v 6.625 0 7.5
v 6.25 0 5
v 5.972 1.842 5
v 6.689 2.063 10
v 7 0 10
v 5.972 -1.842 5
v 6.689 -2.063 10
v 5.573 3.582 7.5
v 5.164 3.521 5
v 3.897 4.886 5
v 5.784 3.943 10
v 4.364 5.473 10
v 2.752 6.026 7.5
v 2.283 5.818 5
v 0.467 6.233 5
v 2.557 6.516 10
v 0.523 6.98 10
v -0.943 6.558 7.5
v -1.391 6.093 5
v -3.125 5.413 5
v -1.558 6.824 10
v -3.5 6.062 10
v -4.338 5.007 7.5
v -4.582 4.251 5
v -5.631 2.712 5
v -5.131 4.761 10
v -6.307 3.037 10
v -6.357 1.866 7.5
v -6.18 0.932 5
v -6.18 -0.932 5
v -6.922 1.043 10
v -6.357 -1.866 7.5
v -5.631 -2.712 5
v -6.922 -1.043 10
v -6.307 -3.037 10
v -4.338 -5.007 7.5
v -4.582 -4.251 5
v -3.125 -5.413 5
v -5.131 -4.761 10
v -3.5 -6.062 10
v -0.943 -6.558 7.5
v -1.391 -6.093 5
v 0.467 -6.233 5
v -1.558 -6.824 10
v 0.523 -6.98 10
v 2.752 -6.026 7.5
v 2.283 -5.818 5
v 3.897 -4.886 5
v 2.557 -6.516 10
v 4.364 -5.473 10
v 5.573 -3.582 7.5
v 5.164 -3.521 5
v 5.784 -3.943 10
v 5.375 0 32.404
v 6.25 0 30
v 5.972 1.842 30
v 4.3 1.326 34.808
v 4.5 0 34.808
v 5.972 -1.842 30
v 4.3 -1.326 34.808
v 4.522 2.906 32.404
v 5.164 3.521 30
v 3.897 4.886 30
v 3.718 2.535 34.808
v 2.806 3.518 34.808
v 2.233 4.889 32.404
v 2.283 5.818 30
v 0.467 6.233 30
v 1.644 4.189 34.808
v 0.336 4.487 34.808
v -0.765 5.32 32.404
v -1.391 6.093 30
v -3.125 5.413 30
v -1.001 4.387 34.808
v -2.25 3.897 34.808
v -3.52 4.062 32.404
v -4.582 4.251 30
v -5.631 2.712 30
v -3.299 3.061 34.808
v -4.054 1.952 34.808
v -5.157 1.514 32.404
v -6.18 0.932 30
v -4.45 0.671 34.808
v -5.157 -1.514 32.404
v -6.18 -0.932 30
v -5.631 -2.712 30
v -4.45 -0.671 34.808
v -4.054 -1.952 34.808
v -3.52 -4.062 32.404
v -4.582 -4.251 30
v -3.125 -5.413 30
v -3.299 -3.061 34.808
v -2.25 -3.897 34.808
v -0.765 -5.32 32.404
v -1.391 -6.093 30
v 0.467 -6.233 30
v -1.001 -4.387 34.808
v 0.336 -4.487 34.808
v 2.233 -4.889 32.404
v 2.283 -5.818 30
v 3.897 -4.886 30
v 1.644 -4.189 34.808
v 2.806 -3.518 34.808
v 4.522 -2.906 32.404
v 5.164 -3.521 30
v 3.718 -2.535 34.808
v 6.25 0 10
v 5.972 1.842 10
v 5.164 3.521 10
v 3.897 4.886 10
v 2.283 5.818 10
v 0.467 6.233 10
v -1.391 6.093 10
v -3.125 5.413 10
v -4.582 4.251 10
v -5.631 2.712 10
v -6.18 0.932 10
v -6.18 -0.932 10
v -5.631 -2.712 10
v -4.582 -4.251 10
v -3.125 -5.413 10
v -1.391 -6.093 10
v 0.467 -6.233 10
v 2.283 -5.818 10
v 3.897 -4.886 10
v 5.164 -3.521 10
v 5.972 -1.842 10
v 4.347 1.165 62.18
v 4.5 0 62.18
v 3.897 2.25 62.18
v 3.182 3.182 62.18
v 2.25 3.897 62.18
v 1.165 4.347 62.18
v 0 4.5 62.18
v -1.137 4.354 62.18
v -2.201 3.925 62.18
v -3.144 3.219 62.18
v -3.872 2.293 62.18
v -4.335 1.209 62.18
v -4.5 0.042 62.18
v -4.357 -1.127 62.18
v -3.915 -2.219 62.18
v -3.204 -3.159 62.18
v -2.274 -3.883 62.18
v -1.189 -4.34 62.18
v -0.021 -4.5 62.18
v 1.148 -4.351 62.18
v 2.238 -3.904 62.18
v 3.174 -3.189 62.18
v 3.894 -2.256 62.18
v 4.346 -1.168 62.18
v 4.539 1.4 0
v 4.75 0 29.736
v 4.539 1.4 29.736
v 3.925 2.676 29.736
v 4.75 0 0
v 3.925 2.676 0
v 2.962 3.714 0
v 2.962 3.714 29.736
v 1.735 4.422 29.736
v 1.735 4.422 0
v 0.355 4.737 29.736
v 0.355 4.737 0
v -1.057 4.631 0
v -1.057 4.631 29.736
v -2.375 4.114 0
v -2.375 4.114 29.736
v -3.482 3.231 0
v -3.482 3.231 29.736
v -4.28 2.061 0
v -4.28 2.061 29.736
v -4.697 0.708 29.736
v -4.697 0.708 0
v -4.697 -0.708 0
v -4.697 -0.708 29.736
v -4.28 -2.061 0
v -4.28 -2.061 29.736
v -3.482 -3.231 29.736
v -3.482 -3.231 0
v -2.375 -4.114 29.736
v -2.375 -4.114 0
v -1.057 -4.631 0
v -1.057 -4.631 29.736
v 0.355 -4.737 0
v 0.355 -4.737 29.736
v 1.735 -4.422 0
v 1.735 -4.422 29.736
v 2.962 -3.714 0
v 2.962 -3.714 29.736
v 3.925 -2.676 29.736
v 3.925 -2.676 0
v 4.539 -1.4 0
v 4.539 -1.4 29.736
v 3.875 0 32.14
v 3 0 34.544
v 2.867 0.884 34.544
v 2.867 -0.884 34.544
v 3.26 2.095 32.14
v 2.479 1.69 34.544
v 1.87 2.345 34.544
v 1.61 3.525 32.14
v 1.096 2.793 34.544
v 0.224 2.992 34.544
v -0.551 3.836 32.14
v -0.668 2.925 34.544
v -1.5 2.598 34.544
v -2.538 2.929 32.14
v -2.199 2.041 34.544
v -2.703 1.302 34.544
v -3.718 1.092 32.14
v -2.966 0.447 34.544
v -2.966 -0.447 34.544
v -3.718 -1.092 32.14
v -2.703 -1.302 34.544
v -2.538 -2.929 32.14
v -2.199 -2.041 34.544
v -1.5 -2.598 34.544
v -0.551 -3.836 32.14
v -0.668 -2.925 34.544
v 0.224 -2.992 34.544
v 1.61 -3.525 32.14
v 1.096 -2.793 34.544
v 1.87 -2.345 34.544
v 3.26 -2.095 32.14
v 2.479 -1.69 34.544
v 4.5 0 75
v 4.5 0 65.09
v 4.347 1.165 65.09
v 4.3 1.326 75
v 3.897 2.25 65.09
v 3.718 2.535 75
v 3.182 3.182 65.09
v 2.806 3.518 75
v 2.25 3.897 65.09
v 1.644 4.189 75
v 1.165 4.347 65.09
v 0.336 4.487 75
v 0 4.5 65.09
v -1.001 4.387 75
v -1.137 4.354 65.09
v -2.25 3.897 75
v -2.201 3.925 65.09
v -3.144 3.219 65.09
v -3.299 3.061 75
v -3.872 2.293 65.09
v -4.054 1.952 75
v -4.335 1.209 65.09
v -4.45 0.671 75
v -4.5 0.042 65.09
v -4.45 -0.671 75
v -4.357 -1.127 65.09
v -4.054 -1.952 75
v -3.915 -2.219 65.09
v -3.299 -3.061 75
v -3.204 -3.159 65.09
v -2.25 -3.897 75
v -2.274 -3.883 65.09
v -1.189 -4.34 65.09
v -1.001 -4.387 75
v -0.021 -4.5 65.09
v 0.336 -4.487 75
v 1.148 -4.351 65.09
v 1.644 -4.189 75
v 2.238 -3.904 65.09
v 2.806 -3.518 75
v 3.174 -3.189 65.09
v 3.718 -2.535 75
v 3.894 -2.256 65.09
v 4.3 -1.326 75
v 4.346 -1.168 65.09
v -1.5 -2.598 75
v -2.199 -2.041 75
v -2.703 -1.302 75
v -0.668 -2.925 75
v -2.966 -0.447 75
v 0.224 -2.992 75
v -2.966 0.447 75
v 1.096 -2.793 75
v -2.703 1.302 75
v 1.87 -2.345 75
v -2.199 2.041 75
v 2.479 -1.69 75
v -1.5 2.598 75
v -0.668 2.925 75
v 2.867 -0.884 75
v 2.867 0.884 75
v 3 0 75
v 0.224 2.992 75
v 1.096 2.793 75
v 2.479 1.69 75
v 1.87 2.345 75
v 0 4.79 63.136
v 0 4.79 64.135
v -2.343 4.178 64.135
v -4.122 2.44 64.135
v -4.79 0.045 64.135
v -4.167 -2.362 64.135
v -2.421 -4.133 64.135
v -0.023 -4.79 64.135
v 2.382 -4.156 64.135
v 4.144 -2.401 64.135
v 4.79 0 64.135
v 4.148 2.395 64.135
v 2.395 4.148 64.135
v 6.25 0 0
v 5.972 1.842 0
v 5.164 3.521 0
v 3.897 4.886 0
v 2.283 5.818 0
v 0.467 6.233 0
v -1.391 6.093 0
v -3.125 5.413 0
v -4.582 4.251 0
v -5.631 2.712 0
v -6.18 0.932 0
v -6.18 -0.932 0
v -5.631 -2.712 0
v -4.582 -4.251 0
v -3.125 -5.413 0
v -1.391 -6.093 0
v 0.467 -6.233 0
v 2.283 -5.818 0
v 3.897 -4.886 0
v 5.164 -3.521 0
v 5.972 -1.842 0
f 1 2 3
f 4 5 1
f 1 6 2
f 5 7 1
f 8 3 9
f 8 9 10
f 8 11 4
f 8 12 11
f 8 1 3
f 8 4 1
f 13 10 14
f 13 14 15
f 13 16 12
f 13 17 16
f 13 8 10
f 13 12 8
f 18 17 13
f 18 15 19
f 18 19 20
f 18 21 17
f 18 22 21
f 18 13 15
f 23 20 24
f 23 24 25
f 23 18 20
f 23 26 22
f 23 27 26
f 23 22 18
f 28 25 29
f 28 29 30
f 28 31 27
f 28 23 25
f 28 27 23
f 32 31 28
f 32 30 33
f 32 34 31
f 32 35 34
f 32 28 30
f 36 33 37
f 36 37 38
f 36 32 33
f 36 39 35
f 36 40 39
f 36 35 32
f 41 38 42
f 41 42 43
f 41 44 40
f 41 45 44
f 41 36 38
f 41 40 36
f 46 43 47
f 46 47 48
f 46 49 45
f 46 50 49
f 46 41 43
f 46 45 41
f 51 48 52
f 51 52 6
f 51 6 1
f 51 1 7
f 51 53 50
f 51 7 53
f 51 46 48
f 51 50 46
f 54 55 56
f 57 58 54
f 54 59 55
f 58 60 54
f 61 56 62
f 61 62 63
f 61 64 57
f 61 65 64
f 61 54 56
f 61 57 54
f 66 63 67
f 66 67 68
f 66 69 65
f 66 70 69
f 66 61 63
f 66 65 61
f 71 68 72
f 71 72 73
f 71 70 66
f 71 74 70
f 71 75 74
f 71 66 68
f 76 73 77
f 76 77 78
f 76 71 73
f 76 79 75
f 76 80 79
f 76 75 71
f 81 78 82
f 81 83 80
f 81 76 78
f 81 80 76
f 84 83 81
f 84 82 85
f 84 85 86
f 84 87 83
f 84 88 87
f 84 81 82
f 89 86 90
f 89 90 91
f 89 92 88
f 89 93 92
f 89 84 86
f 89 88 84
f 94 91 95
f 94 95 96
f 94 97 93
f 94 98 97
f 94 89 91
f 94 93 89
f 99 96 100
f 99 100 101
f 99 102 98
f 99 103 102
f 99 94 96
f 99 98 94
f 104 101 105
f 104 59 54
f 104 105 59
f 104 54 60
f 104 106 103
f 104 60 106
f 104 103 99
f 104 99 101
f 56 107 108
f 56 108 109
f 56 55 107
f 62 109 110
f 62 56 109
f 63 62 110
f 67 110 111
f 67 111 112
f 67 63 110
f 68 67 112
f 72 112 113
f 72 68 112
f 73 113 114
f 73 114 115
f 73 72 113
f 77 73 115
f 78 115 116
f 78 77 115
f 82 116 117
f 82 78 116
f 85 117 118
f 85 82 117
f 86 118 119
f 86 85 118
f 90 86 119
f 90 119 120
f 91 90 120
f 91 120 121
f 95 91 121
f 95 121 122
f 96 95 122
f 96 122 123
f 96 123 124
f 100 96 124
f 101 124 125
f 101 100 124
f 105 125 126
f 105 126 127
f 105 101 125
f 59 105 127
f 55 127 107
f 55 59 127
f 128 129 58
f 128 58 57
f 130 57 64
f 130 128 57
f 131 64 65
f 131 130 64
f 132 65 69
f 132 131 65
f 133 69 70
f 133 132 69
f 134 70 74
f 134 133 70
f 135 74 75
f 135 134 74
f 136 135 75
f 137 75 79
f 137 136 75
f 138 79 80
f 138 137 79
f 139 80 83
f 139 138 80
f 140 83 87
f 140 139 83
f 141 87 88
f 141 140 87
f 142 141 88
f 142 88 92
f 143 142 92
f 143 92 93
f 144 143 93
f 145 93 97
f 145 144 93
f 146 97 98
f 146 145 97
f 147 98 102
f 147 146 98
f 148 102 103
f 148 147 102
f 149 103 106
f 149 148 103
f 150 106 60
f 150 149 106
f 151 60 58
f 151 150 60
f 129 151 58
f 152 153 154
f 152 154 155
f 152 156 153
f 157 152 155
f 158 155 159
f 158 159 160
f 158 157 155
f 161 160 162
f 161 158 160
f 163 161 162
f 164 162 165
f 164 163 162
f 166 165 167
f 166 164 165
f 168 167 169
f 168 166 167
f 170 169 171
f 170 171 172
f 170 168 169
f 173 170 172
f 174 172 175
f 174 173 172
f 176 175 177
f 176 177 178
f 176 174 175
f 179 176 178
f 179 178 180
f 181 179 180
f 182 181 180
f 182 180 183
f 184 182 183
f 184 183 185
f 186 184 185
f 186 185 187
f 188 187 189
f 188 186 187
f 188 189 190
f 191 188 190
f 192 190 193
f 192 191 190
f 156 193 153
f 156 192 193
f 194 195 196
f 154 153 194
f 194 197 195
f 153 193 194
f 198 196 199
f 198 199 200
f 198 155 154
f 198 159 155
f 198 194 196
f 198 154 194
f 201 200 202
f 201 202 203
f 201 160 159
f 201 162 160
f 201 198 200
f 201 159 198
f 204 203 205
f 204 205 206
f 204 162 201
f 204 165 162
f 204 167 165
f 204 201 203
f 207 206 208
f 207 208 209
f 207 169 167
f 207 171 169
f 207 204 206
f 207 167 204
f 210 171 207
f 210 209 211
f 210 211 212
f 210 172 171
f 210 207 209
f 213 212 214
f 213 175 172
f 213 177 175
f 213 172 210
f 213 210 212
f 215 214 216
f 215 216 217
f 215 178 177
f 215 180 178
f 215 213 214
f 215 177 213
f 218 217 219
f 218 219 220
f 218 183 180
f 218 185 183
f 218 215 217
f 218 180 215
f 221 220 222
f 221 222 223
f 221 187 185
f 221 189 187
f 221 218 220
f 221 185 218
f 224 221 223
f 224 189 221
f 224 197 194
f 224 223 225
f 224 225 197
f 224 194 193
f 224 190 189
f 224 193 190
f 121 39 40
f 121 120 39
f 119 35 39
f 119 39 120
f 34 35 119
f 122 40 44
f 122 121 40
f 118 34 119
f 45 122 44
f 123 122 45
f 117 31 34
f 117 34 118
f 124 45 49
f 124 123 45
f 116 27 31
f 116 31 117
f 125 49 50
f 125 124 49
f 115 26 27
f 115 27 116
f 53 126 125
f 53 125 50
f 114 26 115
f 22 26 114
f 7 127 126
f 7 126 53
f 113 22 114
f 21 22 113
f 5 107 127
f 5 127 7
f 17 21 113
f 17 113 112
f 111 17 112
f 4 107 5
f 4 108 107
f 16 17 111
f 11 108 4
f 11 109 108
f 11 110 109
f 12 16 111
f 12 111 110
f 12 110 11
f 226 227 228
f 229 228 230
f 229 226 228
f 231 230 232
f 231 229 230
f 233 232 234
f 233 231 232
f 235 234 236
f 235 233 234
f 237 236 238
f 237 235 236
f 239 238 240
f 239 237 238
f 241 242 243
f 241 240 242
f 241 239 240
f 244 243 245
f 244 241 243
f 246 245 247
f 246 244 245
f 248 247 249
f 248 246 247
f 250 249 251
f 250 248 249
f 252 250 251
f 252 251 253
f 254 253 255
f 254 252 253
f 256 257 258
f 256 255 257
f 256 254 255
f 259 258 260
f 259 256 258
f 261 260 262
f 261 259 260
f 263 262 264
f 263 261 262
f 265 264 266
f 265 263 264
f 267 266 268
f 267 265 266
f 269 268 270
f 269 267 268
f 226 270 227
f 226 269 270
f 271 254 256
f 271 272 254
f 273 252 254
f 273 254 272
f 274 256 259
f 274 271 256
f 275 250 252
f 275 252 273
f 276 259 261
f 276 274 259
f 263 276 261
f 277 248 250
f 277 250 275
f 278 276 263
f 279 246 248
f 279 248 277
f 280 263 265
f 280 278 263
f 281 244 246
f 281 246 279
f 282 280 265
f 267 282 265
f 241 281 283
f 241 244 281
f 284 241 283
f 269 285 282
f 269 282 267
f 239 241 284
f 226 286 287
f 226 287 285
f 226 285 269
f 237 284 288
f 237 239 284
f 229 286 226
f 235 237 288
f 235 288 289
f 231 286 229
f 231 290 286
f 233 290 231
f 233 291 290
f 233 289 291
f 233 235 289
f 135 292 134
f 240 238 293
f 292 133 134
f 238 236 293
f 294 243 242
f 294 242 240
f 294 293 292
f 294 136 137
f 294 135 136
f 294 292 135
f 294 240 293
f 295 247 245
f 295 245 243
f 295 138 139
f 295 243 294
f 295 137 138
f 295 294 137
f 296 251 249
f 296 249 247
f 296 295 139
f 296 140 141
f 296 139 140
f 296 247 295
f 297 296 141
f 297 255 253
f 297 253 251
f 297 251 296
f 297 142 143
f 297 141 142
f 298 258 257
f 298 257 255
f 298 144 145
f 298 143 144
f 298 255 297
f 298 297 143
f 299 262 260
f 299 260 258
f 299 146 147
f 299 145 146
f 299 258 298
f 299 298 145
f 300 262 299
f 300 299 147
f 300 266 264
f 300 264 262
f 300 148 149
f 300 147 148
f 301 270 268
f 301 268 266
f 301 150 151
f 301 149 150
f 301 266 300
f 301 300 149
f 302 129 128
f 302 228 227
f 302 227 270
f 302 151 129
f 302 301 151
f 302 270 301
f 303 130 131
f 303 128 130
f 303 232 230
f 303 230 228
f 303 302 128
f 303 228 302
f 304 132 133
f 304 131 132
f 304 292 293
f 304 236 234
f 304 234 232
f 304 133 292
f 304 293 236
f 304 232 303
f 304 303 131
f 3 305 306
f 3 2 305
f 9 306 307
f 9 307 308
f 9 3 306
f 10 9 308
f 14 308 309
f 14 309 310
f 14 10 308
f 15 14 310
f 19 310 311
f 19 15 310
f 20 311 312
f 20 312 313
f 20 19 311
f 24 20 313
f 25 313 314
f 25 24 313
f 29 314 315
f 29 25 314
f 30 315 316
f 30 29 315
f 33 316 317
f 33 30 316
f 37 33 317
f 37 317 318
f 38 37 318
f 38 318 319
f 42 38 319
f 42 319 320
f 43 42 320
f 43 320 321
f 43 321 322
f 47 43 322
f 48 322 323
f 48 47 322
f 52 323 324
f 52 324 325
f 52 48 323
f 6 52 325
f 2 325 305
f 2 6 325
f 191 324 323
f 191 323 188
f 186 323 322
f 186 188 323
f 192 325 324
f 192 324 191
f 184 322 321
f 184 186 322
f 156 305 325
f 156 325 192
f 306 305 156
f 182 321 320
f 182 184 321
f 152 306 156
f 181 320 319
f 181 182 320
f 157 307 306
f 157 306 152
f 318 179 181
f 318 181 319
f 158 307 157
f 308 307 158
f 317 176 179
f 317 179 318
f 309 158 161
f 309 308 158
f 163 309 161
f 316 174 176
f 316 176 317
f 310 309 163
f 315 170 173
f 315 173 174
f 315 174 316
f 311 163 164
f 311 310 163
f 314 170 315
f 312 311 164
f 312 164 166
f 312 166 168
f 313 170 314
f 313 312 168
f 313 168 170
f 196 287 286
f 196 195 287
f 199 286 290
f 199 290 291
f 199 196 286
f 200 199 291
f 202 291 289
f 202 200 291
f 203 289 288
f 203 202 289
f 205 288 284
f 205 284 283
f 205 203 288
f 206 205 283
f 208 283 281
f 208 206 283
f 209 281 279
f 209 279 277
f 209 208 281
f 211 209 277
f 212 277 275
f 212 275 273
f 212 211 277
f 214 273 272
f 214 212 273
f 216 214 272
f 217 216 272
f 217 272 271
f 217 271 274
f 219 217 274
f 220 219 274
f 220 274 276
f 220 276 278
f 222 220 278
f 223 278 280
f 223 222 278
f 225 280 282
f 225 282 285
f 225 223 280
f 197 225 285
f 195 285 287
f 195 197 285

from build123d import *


with BuildPart() as f1:
    # F0 (on Front) → F1 (revolve)
    with BuildSketch(Plane.XZ):
        Polygon((4.75, 0), (6.25, 0), (6.25, 5), (7, 10), (6.25, 10), (6.25, 30), (4.5, 34.808085), (4.5, 75), (3, 75), (3, 34.543595), (4.75, 29.73551), align=None)
    revolve(axis=Axis((0, 0, 35.781112), (0, 0, 1)))

    # F2 (on Right) → F3 (revolve)
    with BuildSketch(Plane.YZ):
        with BuildLine():
            Line((4.4, 65.285346), (4.4, 61.985346))
            ThreePointArc((4.4, 61.985346), (4.826595, 63.635346), (4.4, 65.285346))
        make_face()
    revolve(axis=Axis((0, 0, 60.848506), (0, 0, 1)))


solid = f1.part
